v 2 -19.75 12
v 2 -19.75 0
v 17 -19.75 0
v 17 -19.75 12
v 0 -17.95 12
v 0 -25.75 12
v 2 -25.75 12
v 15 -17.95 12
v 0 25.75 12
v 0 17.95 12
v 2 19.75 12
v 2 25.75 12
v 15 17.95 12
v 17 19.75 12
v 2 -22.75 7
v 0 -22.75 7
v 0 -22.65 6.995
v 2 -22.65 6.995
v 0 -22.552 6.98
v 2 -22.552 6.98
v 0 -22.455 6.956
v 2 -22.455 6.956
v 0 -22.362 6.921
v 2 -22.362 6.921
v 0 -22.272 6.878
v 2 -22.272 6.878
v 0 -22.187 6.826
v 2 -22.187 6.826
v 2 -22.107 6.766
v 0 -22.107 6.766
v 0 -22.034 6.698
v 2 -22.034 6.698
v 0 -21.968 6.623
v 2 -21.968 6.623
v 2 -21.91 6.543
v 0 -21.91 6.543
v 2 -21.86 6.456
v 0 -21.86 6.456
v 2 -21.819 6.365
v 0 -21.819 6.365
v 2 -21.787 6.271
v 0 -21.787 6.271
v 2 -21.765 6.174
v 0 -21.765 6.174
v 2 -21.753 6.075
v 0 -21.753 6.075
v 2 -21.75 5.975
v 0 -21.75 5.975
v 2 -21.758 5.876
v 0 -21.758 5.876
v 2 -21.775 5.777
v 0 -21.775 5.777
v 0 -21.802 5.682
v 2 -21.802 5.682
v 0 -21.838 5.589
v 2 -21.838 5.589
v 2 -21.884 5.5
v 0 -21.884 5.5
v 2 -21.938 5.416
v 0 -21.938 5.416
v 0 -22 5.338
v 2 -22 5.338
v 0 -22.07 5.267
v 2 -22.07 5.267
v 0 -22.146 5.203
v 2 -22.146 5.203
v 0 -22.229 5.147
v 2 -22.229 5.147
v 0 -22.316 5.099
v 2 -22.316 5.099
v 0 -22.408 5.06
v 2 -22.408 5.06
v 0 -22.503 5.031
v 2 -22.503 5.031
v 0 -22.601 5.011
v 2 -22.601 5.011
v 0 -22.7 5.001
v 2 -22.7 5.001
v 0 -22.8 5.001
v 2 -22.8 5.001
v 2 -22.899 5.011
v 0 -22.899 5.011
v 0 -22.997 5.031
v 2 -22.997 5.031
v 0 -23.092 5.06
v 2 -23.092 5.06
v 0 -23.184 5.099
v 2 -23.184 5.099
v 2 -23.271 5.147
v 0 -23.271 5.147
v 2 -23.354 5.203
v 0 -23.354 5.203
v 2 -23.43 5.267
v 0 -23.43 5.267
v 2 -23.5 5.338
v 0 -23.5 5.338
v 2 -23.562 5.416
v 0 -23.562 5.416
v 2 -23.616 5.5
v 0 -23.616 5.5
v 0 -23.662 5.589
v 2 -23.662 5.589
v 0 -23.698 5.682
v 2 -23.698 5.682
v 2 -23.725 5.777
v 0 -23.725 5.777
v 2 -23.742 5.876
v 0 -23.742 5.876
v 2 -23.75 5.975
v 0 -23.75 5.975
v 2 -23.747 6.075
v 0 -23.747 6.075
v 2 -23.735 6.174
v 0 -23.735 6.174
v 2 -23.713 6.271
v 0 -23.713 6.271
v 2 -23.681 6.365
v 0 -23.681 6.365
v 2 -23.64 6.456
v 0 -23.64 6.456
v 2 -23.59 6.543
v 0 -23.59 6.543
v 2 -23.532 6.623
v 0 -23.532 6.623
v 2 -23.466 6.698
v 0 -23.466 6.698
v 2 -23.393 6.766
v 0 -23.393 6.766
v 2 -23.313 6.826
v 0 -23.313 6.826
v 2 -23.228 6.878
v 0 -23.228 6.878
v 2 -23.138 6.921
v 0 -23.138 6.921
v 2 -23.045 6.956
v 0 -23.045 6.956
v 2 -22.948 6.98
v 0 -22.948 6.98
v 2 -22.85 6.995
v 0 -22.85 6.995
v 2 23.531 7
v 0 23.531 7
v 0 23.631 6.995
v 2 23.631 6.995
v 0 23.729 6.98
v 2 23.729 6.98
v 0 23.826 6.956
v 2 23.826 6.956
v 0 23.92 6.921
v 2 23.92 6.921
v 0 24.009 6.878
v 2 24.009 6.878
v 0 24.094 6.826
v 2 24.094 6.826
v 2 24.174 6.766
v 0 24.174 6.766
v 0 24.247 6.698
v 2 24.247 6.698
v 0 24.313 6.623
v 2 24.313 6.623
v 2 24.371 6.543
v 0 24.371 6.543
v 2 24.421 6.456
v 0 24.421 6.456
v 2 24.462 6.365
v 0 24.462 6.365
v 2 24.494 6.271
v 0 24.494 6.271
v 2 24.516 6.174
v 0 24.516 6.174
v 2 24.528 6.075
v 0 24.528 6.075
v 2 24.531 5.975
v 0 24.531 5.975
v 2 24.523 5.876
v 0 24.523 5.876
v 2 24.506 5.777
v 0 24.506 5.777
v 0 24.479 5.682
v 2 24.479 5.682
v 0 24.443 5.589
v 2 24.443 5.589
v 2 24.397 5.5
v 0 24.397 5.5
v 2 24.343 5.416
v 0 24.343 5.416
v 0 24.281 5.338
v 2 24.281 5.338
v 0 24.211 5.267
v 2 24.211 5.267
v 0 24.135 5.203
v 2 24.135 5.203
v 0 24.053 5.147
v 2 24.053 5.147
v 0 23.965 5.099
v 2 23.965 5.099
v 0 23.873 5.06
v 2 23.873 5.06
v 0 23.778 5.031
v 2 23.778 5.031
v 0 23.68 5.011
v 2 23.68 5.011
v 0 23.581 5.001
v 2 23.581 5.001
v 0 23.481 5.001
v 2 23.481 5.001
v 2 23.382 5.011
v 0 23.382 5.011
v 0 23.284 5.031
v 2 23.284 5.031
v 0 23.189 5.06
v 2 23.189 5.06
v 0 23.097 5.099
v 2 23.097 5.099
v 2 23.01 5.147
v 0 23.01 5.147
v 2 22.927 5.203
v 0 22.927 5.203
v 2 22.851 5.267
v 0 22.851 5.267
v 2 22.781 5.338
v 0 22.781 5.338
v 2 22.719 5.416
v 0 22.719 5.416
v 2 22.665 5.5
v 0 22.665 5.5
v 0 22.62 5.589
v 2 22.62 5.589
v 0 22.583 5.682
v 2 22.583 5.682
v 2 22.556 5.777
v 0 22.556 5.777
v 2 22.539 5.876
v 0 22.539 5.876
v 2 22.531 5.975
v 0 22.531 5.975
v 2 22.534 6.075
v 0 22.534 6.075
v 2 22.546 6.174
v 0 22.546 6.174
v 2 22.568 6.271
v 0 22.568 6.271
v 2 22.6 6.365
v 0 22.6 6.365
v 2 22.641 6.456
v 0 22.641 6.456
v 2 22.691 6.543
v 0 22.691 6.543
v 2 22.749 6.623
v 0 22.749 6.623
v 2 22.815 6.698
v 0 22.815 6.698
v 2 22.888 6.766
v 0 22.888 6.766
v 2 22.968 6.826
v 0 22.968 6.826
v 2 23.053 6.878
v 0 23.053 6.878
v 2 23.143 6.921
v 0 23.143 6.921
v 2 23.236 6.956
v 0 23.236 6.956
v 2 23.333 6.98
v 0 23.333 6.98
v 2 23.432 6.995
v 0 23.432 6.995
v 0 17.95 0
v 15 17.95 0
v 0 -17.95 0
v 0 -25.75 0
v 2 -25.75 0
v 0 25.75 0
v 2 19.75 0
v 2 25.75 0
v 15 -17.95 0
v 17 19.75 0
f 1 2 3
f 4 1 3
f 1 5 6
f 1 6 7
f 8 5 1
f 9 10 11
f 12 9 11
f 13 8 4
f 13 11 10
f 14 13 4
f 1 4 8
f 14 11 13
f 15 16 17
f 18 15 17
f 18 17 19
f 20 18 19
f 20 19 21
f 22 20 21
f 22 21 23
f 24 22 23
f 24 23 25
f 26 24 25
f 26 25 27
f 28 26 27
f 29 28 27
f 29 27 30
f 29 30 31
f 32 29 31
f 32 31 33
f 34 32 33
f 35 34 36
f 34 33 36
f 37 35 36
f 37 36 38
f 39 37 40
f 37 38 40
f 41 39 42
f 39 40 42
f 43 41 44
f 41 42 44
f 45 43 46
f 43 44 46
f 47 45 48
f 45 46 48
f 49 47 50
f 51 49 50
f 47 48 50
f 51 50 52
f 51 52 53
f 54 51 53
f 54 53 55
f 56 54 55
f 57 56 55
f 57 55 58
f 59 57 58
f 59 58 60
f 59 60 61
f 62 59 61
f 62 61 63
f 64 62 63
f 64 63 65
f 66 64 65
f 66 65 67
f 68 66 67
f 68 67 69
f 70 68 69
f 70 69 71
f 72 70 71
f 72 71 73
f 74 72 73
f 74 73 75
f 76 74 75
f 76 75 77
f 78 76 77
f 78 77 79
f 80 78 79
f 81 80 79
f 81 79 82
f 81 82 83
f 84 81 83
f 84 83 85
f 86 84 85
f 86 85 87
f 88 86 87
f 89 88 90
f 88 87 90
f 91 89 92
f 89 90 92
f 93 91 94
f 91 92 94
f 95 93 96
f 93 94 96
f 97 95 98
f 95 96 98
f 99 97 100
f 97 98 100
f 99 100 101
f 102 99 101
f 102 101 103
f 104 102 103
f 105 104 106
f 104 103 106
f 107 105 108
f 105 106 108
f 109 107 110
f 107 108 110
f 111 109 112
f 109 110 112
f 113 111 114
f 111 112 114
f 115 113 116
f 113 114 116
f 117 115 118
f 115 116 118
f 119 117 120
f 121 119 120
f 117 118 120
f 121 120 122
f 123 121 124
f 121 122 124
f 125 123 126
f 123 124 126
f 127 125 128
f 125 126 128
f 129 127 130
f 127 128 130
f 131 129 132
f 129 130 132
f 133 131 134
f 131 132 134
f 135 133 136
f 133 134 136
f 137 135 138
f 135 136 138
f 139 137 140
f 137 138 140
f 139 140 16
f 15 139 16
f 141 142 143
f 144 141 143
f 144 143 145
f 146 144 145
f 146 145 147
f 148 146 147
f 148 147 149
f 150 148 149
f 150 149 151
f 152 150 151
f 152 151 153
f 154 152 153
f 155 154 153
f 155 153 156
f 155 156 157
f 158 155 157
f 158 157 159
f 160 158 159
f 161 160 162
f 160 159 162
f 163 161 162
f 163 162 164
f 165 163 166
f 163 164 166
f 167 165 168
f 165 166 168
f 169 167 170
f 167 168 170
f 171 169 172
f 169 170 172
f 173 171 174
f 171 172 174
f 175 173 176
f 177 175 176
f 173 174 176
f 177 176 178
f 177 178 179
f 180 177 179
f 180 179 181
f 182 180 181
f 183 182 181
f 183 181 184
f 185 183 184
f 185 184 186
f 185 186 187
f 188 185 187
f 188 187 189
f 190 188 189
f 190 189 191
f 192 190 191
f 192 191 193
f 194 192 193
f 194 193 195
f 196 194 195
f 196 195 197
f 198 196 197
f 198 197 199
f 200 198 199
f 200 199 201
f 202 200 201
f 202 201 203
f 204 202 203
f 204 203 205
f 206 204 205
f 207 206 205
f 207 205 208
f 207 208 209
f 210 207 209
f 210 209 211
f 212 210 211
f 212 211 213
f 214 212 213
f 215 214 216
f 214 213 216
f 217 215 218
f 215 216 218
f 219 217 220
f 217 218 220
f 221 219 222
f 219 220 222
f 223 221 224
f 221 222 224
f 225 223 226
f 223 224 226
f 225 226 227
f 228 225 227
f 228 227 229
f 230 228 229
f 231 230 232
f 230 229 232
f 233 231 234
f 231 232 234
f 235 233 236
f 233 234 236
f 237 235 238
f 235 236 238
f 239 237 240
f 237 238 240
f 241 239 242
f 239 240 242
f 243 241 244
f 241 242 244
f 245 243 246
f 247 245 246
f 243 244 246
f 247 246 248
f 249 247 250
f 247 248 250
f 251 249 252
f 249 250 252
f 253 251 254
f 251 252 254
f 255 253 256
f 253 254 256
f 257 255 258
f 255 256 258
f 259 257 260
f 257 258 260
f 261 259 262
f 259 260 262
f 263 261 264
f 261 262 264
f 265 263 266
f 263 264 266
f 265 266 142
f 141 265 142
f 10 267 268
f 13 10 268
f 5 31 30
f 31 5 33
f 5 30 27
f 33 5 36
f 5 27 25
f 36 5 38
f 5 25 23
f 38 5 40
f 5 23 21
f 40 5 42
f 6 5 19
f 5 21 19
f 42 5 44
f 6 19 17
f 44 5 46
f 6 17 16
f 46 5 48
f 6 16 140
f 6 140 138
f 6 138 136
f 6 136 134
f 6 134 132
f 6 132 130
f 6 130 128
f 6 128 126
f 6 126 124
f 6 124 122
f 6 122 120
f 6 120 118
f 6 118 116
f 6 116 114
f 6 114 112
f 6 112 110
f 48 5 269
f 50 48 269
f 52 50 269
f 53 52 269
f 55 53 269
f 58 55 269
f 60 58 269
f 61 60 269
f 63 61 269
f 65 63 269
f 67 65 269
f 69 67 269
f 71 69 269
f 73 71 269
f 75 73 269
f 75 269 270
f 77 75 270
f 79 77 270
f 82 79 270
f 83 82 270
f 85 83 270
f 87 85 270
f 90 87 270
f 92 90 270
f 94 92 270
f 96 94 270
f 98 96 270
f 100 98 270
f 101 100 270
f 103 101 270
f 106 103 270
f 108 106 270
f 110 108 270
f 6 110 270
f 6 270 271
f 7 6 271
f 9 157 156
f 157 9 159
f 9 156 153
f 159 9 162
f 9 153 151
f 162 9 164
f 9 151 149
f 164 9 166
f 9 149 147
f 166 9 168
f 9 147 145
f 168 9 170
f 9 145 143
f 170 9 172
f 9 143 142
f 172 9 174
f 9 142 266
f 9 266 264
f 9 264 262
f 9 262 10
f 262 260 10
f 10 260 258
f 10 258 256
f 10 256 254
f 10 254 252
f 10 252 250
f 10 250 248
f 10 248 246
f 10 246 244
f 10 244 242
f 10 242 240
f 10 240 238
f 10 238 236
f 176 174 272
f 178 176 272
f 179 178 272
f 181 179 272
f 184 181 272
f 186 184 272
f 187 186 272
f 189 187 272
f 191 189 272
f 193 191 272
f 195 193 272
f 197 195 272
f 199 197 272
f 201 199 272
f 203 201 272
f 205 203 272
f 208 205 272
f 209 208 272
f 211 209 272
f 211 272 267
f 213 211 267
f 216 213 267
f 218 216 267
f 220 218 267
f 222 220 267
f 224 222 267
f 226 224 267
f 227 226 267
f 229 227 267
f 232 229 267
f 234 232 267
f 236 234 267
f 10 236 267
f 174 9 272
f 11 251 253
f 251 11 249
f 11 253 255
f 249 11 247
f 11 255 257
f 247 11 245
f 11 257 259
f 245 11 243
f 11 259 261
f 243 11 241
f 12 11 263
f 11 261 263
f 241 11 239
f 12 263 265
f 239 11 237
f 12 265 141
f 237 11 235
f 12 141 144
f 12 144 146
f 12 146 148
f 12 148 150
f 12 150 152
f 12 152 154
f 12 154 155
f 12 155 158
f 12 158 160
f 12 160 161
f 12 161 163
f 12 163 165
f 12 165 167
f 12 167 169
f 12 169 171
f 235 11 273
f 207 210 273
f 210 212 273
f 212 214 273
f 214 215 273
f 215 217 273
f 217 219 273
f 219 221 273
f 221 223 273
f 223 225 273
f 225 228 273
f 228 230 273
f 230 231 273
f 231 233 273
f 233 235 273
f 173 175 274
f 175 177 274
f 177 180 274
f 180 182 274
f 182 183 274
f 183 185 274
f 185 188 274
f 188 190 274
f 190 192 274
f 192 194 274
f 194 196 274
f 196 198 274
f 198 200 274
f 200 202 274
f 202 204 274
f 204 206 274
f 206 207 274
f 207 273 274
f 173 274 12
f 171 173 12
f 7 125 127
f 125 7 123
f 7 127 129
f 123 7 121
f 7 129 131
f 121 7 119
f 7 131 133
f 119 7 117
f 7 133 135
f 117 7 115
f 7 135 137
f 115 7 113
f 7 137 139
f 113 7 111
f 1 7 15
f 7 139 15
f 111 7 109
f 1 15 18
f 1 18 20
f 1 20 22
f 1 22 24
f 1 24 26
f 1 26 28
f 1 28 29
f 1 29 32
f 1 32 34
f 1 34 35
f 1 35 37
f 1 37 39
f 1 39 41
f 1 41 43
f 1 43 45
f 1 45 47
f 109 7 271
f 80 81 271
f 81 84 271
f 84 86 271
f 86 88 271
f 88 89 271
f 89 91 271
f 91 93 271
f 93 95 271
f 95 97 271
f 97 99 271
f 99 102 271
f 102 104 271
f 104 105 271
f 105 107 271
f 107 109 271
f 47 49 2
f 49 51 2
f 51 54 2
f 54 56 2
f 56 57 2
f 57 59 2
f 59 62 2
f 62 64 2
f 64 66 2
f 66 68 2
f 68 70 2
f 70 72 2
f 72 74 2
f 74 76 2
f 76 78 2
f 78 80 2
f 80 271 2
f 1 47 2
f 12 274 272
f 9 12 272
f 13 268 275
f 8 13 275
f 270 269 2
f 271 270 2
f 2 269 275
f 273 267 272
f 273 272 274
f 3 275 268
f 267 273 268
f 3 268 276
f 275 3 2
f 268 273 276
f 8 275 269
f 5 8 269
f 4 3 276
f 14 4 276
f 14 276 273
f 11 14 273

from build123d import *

# Parameters (mm, degrees)
EXTRUDE_1_DEPTH     = 12
SKETCH_2_R          = 1
CUT_EXTRUDE_1_DEPTH = 3


with BuildPart() as part:
    # 草图1 → 凸台-拉伸1 (new body)
    with BuildSketch(Plane.XY):
        Polygon((0, 25.75), (0, 17.95), (15, 17.95), (15, -17.95), (0, -17.95), (0, -25.75), (2, -25.75), (2, -19.75), (17, -19.75), (17, 19.75), (2, 19.75), (2, 25.75), align=None)
    extrude(amount=EXTRUDE_1_DEPTH)

    # 草图2 → 切除-拉伸1 (cut)
    with BuildSketch(Plane.ZY):
        with Locations((6, 23.531116708)):
            Circle(SKETCH_2_R)
        with Locations((6, -22.75)):
            Circle(SKETCH_2_R)
    extrude(amount=-CUT_EXTRUDE_1_DEPTH, mode=Mode.SUBTRACT)


solid = part.part
